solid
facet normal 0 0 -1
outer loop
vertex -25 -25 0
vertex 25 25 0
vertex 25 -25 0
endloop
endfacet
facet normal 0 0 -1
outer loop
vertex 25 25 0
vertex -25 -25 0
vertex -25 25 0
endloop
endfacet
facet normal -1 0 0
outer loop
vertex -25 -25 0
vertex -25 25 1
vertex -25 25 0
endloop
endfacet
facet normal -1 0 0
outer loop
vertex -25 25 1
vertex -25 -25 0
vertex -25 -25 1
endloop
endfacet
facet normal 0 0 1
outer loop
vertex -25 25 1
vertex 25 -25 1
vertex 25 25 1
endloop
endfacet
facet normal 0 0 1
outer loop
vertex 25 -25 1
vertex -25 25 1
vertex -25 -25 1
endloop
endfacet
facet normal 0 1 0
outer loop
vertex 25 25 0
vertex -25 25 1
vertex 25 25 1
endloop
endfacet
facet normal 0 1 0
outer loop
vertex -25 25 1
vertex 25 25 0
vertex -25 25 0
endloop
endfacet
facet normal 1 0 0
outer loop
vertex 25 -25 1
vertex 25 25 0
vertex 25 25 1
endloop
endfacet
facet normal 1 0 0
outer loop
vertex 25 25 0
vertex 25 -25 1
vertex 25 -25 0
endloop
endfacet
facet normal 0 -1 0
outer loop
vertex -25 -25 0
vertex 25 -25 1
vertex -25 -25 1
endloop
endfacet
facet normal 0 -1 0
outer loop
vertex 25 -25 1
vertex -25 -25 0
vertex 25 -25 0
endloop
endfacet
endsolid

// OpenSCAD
/* ---------------------------------------------------------------------------
   AprilTag 36h11 renderer -- turns a decoded tag id into the two solids a
   multi-material printer needs for a clean one-pass two-color print: no
   glue, no manual filament swap, no finishing step. Meant to be `use`d from
   another design (e.g. apriltag_corner_mount.scad) alongside its own
   `color()` calls, not run standalone.

   Bit data comes from `apriltags-36h11-1-499.scad` (generated by
   apriltag-gen's `export-scad`, ids 1..499, TAG_36H11_BITS[id] indexed
   directly by id -- index 0 is an empty placeholder, not a real tag). That
   data is the interior payload only (6x6), 0 = black, 1 = white, border
   already excluded -- see apriltag_gen/tags.py's payload_bits() docstring.

   AprilTag convention, per Aaron 2026-09-28: the black portion is raised --
   the fixed one-module black border ring plus every payload cell whose bit
   is 0. The border ring itself carries no per-tag data (moms_apriltag's
   output has it solid black for every id in every 36h11 tag), so it is
   drawn from geometry alone, not from the bit array.

   Two solids, not one, and never unioned with each other -- this is what
   makes a colored 3MF export possible at all:
     - `april_tag_base()` -- the white background plate, the full edge x edge
       square, Z in [0, thickness]. Does not depend on the tag id.
     - `april_tag_pattern()` -- the raised black layer: border ring + payload
       cells where bit == 0, Z in [thickness, thickness + raise_h], sharing
       a flush face with the base's top (no gap, no overlap).

   Coordinate convention: centred on X = Y = 0 in the tag's own plane, Z = 0
   at the base's underside. Module grid: n = payload width + 2 (border on
   both sides) = 8 for 36h11.

   Verification: orientation (which corner is which) is exactly the kind of
   silently-wrong-not-loud risk this project's governing principle warns
   about, so it does not stop at "the file parses." Checked for id 1 by
   exporting `april_tag_pattern()` alone to STL and testing point containment
   (trimesh) at each of the 8x8 cell centres against tags.py's own
   tag_bits('tag36h11', 1) -- an exact match, border and all, not just a
   visual eyeball. Re-run that check if this file's row/col mapping, or the
   payload-vs-border split, ever changes.

   REV 1.0: initial. First draft unioned a difference()-built border frame
     with the payload cells as siblings before extruding; that union()
     silently dropped the frame entirely (confirmed by isolating it -- the
     frame alone rendered fine, but as soon as it was union()'d with even
     one sibling square, it vanished from the CGAL render with no warning or
     error). Reworked so the black area is a single difference(): the full
     square minus only the white cells, since the border ring, being outside
     the payload's row/col range, is never subtracted and stays solid with
     no separate frame primitive needed.
   --------------------------------------------------------------------------- */

include <apriltags-36h11-1-499.scad>

/* [Tag] */
tag_id   = 1;    // which 36h11 id to preview  [1:499]
tag_edge = 50;   // outer black-square width, mm -- matches apriltag-gen's own --size convention
thickness = 1.0; // base plate height, mm  [0.4:0.1:3]
raise_h   = 0.6; // raised black layer height above the base, mm  [0.2:0.1:2]

/* [Colors] */
base_color  = "White";
raise_color = "Black";

/* [Render] */
$fn = $preview ? 16 : 32;
eps = 0.01;

// ---------------------------------------------------------------------------

module april_tag_base(edge = tag_edge, thickness = thickness) {
    linear_extrude(thickness)
        square(edge, center = true);
}

module april_tag_pattern(id = tag_id, edge = tag_edge, thickness = thickness, raise_h = raise_h) {
    bits = TAG_36H11_BITS[id];
    n    = len(bits) + 2;
    cell = edge / n;

    translate([0, 0, thickness])
        linear_extrude(raise_h)
            translate([-edge / 2, -edge / 2])
                // Black area = the full square minus the white cells only.
                // The border ring is outside the payload's row/col range, so
                // it is never subtracted and stays solid automatically -- no
                // separate frame primitive needed. (A union() of a
                // difference()-built frame with sibling squares was tried
                // first and silently dropped the frame entirely; this
                // single-difference form sidesteps that.)
                difference() {
                    square(edge);
                    // payload cells where the bit is 1 (white); row 0 is the
                    // tag's own top row as generated, placed toward +Y here
                    for (row = [0 : len(bits) - 1], col = [0 : len(bits[0]) - 1])
                        if (bits[row][col] == 1)
                            translate([(col + 1) * cell, (n - 2 - row) * cell])
                                square(cell);
                }
}

module april_tag(id = tag_id, edge = tag_edge, thickness = thickness, raise_h = raise_h,
                  base_color = base_color, raise_color = raise_color) {
    // standalone preview only -- a real two-color export colours the two
    // halves at the call site instead, see the file header
    color(base_color)  april_tag_base(edge = edge, thickness = thickness);
    color(raise_color) april_tag_pattern(id = id, edge = edge, thickness = thickness, raise_h = raise_h);
}

april_tag();
